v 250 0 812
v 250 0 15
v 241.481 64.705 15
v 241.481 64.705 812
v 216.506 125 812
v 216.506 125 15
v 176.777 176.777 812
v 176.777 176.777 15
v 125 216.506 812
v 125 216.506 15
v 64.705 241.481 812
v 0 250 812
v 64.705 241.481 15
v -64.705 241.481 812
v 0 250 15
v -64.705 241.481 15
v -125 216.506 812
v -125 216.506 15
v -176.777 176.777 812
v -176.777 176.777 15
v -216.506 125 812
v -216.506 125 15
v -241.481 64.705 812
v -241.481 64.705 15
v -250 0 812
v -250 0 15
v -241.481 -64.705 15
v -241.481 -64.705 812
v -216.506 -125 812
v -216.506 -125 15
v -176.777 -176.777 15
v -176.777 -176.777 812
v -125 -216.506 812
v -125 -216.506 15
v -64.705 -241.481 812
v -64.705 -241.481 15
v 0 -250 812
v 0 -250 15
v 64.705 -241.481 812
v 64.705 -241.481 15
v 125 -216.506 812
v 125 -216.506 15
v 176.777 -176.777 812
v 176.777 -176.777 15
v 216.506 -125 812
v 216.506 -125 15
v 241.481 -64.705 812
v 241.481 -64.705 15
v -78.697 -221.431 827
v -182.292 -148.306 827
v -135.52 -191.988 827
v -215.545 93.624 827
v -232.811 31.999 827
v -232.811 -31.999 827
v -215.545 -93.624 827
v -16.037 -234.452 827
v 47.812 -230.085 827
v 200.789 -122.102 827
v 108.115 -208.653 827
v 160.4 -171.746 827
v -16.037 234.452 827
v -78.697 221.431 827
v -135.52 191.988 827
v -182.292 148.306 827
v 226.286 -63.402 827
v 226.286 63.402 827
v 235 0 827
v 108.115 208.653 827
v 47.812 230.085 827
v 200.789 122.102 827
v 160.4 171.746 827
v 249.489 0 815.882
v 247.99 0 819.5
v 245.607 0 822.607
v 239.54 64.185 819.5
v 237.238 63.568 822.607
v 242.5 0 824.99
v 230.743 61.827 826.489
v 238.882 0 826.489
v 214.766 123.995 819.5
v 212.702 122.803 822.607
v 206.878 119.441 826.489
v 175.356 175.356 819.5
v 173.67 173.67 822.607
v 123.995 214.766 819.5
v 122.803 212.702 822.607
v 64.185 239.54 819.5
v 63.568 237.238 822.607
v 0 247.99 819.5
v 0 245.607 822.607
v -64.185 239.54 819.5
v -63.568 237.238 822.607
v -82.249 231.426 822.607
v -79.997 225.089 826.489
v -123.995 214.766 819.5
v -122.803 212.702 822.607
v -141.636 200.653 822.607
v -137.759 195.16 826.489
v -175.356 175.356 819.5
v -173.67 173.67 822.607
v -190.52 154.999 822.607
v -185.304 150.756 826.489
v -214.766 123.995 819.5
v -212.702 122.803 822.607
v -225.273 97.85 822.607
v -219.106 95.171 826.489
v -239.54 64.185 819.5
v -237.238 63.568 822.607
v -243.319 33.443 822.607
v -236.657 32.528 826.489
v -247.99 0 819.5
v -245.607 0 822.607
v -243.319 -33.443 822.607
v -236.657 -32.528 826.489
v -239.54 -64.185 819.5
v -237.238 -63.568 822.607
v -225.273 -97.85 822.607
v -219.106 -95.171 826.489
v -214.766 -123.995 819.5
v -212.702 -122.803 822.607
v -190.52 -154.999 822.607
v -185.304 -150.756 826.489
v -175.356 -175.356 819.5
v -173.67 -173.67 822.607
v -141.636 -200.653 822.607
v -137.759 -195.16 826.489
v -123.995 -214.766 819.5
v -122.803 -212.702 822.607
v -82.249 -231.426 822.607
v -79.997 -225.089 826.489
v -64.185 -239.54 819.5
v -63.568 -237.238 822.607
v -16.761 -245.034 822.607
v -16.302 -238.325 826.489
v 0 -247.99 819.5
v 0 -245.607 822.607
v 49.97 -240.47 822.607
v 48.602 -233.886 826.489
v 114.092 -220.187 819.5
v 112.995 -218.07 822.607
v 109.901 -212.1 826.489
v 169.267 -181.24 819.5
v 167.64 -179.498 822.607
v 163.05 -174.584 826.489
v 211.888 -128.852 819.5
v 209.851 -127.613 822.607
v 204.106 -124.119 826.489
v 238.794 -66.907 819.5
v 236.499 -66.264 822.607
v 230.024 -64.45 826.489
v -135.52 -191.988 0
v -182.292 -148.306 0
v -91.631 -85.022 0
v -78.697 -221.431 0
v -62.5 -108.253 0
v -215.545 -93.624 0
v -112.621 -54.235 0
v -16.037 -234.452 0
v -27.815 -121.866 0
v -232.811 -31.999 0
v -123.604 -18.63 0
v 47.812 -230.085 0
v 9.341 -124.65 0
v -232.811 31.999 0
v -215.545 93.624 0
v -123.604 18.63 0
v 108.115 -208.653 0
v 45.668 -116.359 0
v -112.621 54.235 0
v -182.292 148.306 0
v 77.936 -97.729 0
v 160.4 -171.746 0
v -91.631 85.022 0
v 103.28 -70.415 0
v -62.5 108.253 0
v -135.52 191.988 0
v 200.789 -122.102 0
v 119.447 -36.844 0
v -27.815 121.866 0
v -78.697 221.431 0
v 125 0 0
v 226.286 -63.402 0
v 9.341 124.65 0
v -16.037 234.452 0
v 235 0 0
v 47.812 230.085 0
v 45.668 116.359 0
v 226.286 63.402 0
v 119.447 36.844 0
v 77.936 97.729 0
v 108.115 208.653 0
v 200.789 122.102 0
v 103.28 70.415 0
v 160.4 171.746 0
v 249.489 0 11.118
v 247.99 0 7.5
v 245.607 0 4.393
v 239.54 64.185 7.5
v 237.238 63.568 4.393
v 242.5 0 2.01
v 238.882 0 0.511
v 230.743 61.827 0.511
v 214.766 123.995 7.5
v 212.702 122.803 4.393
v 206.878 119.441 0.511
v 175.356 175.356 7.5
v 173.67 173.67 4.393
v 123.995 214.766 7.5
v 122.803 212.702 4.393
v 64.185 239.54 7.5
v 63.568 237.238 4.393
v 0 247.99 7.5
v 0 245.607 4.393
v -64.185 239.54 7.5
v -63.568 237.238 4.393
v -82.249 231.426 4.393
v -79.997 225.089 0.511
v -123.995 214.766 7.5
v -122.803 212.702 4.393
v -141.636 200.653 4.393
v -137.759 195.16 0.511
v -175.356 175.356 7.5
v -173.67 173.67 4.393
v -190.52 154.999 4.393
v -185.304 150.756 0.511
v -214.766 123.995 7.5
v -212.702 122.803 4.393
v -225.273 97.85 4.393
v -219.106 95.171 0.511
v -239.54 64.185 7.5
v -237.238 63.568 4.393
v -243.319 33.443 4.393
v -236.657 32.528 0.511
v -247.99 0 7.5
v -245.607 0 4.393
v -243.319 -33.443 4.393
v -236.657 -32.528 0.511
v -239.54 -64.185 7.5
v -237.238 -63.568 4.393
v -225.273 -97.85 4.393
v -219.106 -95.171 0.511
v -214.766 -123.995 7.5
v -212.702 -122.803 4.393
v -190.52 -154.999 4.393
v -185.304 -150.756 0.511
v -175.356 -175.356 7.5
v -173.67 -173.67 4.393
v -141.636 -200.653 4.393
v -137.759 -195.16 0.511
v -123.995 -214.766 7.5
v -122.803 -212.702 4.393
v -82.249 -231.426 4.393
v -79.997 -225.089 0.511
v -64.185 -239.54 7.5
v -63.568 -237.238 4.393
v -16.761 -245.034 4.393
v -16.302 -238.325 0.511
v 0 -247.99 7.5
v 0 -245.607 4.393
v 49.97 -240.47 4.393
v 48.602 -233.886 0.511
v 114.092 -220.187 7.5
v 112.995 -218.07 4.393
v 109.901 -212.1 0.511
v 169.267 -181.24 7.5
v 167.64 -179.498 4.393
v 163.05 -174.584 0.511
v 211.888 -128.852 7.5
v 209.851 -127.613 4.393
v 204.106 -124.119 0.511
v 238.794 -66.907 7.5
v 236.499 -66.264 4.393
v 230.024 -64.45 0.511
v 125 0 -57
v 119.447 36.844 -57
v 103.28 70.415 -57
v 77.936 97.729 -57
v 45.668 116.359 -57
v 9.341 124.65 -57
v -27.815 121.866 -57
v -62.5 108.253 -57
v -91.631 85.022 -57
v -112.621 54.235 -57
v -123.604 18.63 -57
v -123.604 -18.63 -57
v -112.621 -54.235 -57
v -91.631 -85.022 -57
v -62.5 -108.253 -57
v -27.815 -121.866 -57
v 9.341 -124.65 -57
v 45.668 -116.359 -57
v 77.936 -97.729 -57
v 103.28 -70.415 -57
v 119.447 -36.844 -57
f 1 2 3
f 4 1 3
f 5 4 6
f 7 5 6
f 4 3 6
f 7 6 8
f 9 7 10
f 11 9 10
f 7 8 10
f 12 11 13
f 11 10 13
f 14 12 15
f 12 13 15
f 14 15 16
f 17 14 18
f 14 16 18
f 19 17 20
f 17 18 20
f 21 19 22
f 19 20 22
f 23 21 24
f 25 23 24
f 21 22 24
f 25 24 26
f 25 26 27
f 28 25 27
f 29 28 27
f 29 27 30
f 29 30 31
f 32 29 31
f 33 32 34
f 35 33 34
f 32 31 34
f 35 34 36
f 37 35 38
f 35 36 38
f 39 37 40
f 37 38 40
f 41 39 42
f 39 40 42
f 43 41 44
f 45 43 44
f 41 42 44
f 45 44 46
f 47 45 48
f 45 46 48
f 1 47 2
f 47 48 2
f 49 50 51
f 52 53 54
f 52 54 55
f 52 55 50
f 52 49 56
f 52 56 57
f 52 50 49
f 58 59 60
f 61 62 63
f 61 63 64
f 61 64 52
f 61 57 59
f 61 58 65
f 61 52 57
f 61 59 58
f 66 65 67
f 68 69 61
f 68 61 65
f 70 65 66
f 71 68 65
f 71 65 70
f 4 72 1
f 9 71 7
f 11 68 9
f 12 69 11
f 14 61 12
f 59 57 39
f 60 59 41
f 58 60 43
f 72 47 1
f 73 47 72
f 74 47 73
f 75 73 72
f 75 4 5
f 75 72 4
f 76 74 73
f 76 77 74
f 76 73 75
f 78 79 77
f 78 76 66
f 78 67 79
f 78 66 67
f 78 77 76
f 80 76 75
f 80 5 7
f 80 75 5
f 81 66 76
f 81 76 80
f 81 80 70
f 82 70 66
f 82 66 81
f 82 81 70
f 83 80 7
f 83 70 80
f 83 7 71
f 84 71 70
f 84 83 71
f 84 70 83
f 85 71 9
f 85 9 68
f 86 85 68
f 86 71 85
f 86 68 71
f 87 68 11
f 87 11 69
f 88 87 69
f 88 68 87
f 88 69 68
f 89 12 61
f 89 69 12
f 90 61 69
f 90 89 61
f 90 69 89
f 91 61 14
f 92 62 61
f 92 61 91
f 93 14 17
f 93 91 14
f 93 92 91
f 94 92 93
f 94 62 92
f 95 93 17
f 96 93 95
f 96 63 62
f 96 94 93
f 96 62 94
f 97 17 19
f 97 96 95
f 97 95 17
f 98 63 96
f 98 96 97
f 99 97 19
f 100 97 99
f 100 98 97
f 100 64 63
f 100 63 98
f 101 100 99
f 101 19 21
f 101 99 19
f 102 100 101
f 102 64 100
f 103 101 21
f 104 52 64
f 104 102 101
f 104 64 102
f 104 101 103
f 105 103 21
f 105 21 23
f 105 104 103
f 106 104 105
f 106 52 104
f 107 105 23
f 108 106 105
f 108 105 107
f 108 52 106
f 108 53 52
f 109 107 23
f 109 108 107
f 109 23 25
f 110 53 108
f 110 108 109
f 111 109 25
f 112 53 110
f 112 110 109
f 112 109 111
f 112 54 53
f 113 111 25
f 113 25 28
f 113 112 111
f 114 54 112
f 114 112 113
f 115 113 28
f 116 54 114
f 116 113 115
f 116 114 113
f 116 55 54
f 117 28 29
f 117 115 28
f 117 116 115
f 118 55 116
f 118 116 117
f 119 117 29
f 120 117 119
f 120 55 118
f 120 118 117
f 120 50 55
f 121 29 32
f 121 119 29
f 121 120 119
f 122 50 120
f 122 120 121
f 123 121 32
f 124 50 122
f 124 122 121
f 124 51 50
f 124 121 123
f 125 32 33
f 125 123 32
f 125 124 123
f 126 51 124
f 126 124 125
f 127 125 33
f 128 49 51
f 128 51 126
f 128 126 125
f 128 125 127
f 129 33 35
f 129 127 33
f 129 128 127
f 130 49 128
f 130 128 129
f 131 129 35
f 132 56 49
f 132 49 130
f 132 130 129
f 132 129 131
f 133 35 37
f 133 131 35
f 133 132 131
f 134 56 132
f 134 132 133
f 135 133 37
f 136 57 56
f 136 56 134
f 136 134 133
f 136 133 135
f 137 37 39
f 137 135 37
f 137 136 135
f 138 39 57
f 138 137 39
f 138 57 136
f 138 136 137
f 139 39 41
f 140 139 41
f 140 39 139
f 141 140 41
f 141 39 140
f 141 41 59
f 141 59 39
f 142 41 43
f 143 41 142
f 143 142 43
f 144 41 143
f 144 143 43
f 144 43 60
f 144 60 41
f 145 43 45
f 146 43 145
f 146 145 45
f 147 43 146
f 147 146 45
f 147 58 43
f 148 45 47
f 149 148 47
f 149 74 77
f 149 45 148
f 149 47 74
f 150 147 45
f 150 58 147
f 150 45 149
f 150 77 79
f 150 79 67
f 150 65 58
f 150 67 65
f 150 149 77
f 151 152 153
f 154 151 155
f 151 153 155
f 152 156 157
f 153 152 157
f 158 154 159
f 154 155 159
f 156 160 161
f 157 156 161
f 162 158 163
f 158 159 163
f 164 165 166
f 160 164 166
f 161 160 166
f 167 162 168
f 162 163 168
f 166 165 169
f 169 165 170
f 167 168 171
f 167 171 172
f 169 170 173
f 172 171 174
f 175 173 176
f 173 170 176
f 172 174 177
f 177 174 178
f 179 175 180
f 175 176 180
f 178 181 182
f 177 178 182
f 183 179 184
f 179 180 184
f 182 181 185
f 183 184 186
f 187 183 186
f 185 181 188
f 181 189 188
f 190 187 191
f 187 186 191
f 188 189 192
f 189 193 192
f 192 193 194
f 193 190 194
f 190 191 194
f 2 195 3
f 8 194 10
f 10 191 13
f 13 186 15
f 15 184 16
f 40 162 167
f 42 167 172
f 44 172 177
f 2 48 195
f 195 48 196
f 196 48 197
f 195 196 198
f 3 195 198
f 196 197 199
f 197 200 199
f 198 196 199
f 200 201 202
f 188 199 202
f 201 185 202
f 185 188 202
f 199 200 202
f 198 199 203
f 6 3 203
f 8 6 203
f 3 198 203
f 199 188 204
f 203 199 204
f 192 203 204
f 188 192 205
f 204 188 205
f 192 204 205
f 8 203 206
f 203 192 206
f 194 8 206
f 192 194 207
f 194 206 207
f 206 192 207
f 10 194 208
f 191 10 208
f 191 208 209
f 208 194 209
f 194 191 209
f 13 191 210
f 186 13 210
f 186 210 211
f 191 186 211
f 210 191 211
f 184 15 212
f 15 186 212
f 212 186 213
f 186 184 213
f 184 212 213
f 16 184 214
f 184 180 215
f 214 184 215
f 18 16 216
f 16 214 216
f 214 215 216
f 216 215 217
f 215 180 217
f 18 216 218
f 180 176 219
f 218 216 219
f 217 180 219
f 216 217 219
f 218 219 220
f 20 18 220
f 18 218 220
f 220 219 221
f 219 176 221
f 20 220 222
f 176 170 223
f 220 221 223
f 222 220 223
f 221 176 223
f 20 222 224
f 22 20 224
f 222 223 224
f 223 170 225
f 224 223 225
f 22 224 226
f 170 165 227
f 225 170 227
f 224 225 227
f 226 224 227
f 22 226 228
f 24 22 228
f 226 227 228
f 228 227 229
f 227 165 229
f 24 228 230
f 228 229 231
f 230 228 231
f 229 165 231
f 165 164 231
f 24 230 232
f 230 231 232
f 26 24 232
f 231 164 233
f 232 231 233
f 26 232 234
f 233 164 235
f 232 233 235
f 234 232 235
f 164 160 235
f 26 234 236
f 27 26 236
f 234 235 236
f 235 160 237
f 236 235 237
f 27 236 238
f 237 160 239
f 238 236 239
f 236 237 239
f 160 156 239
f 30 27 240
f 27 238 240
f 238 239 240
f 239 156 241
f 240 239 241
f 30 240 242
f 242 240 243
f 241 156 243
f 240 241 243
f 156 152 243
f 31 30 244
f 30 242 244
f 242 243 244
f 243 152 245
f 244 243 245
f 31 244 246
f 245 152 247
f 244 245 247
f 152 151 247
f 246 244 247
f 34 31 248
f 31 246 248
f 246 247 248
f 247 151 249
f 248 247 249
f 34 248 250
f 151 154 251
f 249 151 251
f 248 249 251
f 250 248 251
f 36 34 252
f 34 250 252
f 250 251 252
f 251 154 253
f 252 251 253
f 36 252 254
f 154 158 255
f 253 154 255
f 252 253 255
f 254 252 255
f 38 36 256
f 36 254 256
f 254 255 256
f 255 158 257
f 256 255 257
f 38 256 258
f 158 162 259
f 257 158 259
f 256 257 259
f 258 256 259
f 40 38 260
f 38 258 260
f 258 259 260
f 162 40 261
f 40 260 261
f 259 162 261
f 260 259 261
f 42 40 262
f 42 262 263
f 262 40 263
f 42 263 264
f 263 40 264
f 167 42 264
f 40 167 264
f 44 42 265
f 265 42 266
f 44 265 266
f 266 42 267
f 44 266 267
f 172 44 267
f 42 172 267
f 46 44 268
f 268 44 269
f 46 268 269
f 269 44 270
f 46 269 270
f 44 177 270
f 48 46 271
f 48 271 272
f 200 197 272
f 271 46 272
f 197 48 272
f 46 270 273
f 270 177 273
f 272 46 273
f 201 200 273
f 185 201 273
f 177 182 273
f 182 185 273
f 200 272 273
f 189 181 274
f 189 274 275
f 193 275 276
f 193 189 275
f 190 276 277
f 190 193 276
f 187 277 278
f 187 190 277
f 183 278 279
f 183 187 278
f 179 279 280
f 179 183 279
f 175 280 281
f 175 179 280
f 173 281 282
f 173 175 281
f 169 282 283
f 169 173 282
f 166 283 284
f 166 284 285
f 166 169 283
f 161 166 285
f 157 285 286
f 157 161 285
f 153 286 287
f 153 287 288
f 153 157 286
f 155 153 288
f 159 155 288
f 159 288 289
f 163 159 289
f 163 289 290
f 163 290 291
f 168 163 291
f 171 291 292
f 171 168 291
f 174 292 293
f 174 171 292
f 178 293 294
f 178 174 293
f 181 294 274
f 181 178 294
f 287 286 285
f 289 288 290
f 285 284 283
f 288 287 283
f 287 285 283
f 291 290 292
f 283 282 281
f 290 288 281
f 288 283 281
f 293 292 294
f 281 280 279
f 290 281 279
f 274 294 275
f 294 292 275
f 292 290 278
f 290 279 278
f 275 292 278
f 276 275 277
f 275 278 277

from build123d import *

# Parameters (mm, degrees)
F0_R     = 250
F0_R_2   = 125
F1_DEPTH = 827
F2_DEPTH = 57
F3_R     = 15


with BuildPart() as f1:
    # F0 (on Top) → F1 (new body)
    with BuildSketch(Plane.XY):
        Circle(F0_R)
        Circle(F0_R_2, mode=Mode.SUBTRACT)
        Circle(F0_R_2)
    extrude(amount=F1_DEPTH)

    # F0 (on Top) → F2 (join)
    with BuildSketch(Plane.XY):
        Circle(F0_R_2)
    extrude(amount=-F2_DEPTH)

    # F3
    f3_edges = [f1.edges().sort_by_distance(p)[0] for p in [
        (-250, 0, 827),
        (-250, 0, 0),
    ]]
    fillet(f3_edges, radius=F3_R)


solid = f1.part
